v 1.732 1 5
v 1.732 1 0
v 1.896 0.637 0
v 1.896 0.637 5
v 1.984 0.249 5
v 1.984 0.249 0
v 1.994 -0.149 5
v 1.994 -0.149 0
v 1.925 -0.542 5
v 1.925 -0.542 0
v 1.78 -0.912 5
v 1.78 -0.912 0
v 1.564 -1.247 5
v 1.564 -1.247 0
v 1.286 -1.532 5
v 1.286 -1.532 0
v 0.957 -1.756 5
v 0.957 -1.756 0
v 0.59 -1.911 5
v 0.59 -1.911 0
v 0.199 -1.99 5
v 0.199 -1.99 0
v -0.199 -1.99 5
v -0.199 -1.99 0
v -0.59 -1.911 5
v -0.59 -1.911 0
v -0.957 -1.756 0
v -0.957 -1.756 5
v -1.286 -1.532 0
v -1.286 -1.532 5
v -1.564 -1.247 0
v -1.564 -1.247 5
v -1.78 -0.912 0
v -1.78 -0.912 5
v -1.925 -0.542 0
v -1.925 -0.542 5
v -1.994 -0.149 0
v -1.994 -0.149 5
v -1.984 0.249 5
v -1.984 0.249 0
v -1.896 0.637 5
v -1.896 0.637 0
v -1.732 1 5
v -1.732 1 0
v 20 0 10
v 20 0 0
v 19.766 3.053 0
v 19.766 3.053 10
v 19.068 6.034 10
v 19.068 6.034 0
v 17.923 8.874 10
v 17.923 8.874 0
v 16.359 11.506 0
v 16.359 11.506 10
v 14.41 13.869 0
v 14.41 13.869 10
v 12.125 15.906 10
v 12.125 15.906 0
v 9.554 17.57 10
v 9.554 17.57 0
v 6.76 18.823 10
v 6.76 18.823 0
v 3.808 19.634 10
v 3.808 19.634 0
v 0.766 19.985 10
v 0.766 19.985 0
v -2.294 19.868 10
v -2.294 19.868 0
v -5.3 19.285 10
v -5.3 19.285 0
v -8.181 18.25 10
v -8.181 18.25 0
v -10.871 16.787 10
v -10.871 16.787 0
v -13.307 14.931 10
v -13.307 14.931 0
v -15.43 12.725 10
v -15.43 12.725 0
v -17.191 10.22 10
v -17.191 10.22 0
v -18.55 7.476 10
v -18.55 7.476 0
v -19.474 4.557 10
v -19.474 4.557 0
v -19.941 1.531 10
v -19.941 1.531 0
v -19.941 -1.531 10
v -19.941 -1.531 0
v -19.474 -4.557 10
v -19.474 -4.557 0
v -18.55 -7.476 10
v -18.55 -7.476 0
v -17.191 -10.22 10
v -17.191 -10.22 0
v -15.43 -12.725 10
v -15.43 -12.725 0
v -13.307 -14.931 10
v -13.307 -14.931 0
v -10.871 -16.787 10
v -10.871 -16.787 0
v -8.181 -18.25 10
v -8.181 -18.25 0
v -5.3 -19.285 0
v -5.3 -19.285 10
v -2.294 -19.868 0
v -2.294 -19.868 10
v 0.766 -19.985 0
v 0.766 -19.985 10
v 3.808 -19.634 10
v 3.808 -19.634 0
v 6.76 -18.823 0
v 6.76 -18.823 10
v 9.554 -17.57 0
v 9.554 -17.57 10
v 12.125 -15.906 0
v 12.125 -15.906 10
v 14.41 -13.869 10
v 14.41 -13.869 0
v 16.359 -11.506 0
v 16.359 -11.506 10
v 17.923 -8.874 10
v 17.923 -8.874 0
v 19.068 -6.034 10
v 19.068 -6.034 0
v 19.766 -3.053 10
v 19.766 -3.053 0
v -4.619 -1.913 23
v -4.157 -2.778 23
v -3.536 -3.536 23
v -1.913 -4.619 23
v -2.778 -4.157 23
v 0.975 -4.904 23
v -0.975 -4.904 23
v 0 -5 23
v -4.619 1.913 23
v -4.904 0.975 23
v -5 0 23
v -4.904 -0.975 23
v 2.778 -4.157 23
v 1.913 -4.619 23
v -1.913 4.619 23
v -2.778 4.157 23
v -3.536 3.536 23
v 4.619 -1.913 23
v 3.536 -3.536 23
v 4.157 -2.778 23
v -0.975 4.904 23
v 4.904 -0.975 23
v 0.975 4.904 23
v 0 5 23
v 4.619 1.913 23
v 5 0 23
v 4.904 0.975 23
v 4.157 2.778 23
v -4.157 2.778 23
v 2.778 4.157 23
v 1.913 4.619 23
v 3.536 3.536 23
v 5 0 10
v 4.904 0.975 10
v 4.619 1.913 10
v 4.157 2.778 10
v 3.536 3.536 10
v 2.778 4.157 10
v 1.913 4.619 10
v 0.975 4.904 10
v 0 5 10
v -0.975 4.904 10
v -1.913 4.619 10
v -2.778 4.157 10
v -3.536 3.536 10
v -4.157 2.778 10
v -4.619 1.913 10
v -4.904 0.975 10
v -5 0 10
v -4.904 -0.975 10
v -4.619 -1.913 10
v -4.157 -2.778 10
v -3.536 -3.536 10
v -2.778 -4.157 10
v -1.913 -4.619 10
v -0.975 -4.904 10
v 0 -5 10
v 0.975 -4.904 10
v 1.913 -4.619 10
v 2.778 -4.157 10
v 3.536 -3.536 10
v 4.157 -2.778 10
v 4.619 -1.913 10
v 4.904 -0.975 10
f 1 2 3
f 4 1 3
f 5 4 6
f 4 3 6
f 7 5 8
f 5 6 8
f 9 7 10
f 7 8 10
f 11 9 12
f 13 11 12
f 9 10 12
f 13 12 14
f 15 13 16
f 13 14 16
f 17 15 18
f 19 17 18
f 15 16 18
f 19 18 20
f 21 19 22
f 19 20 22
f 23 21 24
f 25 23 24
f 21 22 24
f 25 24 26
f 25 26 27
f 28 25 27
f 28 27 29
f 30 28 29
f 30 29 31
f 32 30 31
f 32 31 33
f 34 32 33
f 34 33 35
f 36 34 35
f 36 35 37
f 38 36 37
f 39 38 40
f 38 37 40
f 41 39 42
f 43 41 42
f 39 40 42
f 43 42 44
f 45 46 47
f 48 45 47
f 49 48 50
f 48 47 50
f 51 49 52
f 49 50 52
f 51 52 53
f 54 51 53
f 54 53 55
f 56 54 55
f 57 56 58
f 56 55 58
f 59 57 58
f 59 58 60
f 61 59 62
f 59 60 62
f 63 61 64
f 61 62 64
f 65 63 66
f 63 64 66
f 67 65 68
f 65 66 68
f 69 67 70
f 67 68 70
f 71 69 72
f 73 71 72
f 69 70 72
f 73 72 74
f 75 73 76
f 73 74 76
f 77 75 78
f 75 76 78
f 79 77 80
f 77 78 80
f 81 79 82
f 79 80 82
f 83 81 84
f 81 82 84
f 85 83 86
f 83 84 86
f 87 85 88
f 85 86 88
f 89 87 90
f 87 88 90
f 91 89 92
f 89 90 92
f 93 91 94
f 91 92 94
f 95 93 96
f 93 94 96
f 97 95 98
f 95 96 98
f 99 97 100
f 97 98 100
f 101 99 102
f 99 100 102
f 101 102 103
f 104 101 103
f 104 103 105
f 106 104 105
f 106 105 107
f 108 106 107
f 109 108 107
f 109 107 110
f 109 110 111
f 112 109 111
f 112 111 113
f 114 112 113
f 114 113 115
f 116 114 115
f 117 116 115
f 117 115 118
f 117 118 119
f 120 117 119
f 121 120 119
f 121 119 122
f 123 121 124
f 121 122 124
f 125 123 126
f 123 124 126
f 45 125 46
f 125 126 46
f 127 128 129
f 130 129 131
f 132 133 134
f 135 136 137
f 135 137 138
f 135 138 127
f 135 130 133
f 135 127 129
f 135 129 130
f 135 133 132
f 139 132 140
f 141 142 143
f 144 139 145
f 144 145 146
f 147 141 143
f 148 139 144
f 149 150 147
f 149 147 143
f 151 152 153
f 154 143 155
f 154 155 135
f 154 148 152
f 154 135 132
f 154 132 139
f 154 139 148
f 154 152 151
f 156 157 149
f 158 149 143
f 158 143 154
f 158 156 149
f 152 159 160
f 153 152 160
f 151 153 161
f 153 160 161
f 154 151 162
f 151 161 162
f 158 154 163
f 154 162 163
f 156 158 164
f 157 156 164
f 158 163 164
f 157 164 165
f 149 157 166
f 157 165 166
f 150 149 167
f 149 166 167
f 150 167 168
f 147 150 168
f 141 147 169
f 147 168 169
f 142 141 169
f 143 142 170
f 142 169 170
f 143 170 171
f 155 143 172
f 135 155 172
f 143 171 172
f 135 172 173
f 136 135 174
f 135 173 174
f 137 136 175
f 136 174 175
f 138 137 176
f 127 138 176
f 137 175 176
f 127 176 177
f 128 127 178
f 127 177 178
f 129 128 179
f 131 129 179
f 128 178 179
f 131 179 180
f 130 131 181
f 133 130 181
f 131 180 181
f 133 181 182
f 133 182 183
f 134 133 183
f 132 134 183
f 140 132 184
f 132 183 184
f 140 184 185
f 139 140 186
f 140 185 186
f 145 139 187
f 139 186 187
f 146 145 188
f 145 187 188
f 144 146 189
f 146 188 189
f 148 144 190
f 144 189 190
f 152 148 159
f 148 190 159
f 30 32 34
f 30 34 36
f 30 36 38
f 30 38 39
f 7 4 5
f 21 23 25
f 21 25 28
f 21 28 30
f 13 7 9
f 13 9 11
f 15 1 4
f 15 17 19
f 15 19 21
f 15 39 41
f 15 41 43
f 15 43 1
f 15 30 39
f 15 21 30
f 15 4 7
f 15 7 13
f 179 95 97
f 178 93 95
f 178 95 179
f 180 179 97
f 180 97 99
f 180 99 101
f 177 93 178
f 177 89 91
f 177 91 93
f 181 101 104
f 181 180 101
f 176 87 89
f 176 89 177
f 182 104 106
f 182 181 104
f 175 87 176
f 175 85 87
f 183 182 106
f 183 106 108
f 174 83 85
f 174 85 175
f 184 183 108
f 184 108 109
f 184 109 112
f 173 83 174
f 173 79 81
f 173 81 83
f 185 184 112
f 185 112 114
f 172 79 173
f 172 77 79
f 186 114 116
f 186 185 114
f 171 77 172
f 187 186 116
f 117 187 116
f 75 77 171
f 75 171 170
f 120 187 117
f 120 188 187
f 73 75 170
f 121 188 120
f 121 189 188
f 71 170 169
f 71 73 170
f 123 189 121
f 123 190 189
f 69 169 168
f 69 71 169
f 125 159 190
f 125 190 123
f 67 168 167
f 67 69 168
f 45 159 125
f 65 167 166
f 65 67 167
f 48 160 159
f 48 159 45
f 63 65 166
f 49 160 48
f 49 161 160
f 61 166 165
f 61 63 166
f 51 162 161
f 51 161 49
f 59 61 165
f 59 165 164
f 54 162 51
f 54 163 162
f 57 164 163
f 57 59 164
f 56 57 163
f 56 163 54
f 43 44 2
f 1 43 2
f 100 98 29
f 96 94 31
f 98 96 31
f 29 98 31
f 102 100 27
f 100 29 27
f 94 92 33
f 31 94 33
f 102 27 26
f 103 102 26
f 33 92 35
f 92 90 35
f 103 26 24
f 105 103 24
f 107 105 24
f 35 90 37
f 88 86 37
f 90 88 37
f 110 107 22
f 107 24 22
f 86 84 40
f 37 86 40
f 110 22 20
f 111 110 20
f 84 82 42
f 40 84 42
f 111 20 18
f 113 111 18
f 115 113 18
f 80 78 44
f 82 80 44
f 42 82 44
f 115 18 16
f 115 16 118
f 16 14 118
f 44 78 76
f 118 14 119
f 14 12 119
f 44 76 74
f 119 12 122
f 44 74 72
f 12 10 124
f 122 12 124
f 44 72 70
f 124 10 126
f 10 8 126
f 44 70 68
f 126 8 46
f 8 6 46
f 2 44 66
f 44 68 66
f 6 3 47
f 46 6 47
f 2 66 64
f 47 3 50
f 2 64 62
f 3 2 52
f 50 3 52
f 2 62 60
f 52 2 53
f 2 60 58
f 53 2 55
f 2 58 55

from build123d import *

# Parameters (mm, degrees)
F0_R     = 20
F1_DEPTH = 10
F2_R     = 5
F3_DEPTH = 13
F5_DEPTH = 5


with BuildPart() as f1:
    # F0 (on Top) → F1 (new body)
    with BuildSketch(Plane.XY):
        Circle(F0_R)
    extrude(amount=F1_DEPTH)

    # F2 (on face) → F3 (join)
    with BuildSketch(Plane.XY.offset(10)):
        Circle(F2_R)
    extrude(amount=F3_DEPTH)

    # F4 (on face) → F5 (cut)
    with BuildSketch(Plane(origin=(0, 0, 0), x_dir=(1, 0, 0), z_dir=(0, 0, -1))):
        with BuildLine():
            Line((0, -1), (1.732051, -1))
            ThreePointArc((1.732051, -1), (0, 2), (-1.732051, -1))
            Line((-1.732051, -1), (0, -1))
        make_face()
    extrude(amount=-F5_DEPTH, mode=Mode.SUBTRACT)


solid = f1.part
